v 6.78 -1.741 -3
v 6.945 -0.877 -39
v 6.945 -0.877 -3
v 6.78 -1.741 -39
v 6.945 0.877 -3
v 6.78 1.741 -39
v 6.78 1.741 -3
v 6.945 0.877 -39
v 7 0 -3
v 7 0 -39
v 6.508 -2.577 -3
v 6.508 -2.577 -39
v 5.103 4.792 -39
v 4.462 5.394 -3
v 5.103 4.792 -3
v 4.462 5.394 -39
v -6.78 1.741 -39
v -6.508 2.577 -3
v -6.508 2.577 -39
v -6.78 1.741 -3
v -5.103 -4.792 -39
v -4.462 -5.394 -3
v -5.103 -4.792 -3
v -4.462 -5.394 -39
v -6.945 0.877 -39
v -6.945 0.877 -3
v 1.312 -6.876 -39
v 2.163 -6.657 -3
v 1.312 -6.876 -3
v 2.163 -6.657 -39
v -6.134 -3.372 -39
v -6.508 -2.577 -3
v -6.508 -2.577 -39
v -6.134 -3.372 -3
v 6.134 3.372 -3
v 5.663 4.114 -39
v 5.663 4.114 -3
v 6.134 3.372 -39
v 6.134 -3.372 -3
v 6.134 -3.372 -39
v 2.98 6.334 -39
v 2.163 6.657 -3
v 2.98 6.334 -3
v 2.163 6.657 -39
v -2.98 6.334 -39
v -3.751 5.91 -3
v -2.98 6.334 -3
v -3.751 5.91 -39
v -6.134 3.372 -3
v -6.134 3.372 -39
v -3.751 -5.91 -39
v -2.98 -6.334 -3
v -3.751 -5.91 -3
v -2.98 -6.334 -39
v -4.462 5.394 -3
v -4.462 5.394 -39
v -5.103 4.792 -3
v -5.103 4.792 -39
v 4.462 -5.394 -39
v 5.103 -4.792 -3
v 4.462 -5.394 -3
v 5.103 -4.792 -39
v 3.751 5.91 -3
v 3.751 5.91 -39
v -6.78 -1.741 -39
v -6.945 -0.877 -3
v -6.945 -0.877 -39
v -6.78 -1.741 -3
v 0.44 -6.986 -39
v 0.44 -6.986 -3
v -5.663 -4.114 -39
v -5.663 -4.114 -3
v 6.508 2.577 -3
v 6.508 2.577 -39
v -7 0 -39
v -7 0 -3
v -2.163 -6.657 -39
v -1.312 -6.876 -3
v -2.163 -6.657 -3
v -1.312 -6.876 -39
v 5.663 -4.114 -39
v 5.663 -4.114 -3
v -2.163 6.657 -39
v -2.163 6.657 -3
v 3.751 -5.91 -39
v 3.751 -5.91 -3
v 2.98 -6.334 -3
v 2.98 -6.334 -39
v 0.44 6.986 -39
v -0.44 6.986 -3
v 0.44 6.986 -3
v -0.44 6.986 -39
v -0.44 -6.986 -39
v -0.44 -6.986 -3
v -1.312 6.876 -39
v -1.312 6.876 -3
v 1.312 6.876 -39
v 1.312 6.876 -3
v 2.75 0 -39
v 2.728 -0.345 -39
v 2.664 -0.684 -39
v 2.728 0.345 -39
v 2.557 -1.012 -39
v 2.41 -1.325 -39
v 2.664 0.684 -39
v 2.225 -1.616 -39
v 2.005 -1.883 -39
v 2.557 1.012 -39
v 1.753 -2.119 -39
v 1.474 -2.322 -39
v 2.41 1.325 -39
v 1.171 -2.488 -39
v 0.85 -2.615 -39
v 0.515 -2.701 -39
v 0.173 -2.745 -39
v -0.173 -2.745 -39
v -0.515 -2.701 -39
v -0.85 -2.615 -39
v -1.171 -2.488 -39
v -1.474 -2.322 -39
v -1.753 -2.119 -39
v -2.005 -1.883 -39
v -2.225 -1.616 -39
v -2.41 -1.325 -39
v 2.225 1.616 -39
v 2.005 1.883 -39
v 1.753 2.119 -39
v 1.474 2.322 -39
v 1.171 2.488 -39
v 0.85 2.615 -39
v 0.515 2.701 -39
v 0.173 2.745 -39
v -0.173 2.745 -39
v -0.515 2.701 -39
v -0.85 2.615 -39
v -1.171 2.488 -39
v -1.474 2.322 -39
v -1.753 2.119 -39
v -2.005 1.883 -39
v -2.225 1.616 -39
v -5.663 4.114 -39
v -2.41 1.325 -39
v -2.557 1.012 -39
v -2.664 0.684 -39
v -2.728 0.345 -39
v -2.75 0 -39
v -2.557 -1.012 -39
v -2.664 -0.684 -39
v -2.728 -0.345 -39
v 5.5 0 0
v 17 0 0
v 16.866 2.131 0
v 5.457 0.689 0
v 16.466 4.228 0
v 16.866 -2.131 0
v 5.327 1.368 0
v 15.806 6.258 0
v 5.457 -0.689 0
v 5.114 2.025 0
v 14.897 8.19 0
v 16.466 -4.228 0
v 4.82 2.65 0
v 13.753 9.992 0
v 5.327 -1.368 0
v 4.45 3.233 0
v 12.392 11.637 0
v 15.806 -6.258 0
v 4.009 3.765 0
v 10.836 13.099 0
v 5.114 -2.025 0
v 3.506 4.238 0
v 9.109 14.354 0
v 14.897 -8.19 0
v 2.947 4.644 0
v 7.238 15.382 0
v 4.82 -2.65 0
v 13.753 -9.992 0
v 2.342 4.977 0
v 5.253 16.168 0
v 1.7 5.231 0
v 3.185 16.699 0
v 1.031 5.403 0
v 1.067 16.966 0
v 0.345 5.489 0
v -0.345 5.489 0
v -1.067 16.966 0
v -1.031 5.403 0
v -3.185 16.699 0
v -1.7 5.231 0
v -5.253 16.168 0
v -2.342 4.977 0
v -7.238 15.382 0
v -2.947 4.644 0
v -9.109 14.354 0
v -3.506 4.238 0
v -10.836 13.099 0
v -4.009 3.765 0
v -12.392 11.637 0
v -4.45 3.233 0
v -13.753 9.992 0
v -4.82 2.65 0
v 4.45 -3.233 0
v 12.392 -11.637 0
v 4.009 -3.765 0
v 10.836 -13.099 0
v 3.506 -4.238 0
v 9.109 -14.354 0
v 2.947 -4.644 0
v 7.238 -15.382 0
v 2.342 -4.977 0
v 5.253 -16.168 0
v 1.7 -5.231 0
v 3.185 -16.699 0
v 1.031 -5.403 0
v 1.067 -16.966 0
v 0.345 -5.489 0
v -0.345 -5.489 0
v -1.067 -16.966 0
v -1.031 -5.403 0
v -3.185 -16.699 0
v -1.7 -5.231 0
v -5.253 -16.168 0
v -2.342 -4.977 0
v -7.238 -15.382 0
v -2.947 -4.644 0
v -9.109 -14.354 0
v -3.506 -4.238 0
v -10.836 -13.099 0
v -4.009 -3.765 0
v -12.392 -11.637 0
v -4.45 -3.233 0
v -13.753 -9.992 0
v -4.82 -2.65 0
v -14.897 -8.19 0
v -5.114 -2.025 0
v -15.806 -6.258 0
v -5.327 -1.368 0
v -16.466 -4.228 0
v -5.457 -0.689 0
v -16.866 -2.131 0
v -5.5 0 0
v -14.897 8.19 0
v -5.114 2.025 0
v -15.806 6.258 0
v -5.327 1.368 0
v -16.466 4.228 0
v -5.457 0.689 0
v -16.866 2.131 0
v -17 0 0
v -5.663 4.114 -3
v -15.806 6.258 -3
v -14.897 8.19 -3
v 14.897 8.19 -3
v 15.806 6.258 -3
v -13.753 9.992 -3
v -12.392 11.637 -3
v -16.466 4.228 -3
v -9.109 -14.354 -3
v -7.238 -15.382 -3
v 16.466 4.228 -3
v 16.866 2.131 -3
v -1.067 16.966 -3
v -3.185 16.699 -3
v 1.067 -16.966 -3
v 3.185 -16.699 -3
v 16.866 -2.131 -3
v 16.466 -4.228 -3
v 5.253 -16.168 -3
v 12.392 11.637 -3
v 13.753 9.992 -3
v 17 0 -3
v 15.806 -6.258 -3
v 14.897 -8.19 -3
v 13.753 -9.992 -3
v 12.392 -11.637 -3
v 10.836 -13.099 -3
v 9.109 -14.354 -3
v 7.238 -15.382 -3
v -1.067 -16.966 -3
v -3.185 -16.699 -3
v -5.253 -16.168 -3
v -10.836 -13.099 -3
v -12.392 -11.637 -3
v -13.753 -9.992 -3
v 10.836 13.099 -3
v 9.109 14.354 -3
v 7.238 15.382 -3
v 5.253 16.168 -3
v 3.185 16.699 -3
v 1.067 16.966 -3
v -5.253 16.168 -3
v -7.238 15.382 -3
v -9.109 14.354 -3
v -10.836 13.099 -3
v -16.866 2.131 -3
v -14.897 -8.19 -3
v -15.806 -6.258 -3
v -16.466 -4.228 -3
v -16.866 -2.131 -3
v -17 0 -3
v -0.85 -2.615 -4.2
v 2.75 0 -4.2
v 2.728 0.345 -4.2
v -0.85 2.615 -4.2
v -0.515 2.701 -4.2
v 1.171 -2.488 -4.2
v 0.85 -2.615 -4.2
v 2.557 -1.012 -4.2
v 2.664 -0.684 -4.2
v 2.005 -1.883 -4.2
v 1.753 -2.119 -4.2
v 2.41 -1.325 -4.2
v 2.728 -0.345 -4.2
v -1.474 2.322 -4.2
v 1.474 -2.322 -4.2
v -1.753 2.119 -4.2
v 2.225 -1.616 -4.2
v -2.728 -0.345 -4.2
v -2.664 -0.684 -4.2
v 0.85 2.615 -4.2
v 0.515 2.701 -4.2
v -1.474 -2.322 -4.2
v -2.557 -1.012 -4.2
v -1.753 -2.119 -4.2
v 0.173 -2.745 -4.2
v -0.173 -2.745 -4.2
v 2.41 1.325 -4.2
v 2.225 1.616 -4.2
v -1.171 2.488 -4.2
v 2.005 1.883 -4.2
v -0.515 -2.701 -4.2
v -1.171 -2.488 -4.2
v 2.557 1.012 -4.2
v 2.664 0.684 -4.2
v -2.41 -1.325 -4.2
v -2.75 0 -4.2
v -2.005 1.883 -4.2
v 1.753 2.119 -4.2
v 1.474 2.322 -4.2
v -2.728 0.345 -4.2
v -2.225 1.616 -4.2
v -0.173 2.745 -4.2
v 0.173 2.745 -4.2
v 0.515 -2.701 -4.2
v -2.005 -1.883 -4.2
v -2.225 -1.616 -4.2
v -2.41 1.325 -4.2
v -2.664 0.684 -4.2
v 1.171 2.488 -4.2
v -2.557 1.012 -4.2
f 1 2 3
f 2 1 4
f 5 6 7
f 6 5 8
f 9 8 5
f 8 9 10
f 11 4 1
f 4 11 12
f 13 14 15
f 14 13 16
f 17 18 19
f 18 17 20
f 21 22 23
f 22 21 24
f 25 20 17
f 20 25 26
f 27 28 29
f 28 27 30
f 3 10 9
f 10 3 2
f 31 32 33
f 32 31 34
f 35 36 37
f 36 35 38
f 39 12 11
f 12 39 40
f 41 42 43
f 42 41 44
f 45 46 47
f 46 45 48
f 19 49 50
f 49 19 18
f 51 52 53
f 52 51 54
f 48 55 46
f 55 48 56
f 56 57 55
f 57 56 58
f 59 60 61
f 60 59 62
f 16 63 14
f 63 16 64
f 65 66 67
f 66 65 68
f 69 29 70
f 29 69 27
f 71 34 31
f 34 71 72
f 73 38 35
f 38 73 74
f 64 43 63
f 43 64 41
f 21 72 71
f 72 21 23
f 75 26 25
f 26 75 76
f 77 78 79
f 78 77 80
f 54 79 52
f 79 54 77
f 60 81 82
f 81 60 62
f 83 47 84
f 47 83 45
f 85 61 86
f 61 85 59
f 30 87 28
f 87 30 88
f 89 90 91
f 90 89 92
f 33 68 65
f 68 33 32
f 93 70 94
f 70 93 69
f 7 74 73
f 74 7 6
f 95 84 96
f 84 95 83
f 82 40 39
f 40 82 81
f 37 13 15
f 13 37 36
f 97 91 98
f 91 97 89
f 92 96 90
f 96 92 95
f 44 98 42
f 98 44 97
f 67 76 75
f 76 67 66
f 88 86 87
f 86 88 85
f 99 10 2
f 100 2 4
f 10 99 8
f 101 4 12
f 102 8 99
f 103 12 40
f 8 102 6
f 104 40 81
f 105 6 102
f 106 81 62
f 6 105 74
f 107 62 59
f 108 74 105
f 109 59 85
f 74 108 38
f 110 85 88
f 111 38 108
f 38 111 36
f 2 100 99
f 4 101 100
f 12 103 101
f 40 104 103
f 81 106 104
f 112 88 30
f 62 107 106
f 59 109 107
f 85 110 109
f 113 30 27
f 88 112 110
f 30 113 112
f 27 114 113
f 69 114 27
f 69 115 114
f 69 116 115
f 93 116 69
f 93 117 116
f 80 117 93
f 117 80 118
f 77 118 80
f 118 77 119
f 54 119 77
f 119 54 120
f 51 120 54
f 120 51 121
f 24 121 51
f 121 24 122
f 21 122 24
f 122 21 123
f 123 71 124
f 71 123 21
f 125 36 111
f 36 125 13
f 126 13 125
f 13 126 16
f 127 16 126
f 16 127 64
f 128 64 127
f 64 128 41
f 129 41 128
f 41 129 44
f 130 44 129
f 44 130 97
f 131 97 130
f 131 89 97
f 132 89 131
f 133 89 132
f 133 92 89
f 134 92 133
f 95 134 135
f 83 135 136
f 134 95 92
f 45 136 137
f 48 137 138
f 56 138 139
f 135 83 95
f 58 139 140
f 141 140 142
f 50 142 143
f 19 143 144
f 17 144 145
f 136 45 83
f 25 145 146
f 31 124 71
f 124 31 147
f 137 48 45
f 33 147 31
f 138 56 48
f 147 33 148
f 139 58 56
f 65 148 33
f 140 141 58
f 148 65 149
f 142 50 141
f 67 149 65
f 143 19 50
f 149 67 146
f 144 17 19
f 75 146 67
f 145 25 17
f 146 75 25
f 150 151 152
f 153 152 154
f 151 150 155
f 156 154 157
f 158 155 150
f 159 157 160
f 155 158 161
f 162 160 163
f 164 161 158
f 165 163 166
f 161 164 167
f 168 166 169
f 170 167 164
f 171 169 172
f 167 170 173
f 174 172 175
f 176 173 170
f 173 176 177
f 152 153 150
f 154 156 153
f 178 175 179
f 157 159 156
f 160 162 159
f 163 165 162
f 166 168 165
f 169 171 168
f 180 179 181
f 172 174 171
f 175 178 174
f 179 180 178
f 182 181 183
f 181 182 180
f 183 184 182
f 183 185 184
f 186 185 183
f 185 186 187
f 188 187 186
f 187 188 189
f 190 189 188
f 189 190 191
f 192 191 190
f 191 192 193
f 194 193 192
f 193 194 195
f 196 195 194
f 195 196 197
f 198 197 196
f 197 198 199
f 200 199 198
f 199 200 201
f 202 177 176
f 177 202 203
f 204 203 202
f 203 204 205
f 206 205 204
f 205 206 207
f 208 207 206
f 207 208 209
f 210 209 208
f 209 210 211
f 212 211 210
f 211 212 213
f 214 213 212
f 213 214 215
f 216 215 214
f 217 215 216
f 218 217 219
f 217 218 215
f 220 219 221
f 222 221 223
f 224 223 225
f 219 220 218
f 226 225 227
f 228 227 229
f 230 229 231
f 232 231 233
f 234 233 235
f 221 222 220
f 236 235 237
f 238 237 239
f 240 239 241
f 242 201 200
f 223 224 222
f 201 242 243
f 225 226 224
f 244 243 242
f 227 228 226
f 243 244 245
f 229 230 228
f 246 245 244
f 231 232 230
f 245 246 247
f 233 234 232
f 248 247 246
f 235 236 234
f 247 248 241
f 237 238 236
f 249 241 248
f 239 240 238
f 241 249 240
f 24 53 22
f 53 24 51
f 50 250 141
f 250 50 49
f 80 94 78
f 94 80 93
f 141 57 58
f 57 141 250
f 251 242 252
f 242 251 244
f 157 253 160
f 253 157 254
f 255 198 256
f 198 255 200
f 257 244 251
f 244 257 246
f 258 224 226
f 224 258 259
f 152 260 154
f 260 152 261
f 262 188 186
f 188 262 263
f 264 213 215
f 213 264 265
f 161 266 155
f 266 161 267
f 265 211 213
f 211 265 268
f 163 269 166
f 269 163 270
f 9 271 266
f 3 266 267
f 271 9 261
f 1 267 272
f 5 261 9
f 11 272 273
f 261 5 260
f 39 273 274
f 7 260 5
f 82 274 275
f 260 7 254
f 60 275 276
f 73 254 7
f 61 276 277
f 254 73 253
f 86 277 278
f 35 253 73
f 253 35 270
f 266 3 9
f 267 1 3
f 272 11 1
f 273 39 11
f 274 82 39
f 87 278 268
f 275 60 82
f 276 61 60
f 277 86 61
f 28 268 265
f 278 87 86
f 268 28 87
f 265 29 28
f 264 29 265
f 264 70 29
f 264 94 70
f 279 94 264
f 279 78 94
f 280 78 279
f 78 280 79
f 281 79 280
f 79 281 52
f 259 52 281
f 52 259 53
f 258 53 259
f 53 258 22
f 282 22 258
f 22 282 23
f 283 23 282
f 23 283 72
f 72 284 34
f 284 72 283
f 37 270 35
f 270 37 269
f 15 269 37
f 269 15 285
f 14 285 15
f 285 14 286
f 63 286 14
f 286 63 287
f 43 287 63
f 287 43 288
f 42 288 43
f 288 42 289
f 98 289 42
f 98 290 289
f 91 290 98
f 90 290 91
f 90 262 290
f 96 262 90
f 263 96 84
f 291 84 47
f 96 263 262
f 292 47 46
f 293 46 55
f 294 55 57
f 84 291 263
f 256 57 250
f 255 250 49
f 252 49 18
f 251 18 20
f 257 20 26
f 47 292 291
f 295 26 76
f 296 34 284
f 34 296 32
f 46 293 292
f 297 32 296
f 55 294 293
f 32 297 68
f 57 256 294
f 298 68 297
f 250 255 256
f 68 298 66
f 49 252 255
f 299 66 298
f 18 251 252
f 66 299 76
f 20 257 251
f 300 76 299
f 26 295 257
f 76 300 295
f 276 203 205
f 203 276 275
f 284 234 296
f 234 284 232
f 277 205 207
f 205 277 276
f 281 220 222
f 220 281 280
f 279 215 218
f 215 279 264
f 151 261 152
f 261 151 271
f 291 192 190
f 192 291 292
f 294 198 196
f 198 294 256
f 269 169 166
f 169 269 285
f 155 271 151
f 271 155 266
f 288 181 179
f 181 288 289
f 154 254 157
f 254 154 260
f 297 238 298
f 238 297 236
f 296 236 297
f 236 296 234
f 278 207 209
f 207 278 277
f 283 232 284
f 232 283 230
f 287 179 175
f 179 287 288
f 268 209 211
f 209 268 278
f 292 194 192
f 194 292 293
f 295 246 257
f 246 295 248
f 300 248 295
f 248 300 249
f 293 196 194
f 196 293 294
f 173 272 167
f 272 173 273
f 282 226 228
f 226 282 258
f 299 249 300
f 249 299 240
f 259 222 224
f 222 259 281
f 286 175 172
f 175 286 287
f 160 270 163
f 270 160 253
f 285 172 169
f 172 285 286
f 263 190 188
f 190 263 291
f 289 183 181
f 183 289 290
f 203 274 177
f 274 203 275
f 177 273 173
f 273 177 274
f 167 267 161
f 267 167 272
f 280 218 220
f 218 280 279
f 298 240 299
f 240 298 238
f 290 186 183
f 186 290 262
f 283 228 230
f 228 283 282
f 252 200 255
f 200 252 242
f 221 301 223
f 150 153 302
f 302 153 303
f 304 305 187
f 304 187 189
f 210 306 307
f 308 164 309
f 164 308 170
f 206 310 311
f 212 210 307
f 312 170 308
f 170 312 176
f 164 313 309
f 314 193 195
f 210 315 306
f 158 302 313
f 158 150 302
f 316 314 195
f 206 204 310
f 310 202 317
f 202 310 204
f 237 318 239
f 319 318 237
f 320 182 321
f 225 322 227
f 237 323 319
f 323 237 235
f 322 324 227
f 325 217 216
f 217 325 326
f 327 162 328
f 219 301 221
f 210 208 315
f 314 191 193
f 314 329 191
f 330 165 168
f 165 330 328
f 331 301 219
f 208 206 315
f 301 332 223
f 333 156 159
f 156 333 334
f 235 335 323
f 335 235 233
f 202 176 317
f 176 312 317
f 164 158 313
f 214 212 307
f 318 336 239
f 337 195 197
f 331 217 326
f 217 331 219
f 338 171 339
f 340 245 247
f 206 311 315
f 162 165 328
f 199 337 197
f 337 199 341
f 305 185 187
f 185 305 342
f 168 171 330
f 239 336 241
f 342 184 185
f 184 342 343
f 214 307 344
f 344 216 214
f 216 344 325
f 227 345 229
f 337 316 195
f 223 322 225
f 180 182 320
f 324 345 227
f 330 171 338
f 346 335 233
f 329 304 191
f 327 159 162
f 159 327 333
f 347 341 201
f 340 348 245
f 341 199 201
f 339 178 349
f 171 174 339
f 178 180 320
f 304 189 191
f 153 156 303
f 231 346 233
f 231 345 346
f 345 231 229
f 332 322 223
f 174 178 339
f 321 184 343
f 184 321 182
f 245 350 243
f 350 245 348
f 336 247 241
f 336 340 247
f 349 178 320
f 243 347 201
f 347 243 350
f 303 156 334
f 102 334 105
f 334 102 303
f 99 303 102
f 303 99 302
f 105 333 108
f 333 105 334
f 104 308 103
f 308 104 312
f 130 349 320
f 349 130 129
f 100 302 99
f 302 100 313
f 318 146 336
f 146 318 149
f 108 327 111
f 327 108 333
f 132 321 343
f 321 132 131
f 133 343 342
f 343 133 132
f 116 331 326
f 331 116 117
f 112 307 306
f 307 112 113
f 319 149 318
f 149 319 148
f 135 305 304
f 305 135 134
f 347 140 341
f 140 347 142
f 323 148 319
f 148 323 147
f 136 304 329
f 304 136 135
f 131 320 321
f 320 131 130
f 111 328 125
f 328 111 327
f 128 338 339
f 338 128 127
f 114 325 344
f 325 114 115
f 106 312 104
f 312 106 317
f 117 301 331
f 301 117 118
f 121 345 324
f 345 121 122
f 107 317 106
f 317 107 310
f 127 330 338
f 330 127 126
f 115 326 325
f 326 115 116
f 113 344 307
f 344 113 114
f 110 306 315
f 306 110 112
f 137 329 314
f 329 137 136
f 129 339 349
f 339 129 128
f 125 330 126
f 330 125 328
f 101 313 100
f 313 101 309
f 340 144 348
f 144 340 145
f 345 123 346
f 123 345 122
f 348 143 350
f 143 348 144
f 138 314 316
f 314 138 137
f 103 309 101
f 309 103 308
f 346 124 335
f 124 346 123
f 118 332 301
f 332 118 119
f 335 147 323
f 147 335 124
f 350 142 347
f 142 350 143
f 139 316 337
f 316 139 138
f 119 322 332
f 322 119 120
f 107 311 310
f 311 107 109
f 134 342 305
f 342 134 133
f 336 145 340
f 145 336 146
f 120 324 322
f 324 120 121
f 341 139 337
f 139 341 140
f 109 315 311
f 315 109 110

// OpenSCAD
$fn = 50;


difference() {
	union() {
		translate(v = [0, 0, -39.0000000000]) {
			cylinder(h = 39, r = 7.0000000000);
		}
		translate(v = [0, 0, -3.0000000000]) {
			cylinder(h = 3, r = 17.0000000000);
		}
	}
	union() {
		translate(v = [0, 0, 0]) {
			rotate(a = [0, 0, 0]) {
				difference() {
					union() {
						#translate(v = [0, 0, -39.0000000000]) {
							cylinder(h = 39, r = 2.2500000000);
						}
						#translate(v = [0, 0, -4.2000000000]) {
							cylinder(h = 4.2000000000, r = 7.0000000000, r1 = 2.7500000000, r2 = 5.5000000000);
						}
						#translate(v = [0, 0, -39.0000000000]) {
							cylinder(h = 39, r = 2.7500000000);
						}
						#translate(v = [0, 0, -39.0000000000]) {
							cylinder(h = 39, r = 2.2500000000);
						}
					}
					union();
				}
			}
		}
	}
}
